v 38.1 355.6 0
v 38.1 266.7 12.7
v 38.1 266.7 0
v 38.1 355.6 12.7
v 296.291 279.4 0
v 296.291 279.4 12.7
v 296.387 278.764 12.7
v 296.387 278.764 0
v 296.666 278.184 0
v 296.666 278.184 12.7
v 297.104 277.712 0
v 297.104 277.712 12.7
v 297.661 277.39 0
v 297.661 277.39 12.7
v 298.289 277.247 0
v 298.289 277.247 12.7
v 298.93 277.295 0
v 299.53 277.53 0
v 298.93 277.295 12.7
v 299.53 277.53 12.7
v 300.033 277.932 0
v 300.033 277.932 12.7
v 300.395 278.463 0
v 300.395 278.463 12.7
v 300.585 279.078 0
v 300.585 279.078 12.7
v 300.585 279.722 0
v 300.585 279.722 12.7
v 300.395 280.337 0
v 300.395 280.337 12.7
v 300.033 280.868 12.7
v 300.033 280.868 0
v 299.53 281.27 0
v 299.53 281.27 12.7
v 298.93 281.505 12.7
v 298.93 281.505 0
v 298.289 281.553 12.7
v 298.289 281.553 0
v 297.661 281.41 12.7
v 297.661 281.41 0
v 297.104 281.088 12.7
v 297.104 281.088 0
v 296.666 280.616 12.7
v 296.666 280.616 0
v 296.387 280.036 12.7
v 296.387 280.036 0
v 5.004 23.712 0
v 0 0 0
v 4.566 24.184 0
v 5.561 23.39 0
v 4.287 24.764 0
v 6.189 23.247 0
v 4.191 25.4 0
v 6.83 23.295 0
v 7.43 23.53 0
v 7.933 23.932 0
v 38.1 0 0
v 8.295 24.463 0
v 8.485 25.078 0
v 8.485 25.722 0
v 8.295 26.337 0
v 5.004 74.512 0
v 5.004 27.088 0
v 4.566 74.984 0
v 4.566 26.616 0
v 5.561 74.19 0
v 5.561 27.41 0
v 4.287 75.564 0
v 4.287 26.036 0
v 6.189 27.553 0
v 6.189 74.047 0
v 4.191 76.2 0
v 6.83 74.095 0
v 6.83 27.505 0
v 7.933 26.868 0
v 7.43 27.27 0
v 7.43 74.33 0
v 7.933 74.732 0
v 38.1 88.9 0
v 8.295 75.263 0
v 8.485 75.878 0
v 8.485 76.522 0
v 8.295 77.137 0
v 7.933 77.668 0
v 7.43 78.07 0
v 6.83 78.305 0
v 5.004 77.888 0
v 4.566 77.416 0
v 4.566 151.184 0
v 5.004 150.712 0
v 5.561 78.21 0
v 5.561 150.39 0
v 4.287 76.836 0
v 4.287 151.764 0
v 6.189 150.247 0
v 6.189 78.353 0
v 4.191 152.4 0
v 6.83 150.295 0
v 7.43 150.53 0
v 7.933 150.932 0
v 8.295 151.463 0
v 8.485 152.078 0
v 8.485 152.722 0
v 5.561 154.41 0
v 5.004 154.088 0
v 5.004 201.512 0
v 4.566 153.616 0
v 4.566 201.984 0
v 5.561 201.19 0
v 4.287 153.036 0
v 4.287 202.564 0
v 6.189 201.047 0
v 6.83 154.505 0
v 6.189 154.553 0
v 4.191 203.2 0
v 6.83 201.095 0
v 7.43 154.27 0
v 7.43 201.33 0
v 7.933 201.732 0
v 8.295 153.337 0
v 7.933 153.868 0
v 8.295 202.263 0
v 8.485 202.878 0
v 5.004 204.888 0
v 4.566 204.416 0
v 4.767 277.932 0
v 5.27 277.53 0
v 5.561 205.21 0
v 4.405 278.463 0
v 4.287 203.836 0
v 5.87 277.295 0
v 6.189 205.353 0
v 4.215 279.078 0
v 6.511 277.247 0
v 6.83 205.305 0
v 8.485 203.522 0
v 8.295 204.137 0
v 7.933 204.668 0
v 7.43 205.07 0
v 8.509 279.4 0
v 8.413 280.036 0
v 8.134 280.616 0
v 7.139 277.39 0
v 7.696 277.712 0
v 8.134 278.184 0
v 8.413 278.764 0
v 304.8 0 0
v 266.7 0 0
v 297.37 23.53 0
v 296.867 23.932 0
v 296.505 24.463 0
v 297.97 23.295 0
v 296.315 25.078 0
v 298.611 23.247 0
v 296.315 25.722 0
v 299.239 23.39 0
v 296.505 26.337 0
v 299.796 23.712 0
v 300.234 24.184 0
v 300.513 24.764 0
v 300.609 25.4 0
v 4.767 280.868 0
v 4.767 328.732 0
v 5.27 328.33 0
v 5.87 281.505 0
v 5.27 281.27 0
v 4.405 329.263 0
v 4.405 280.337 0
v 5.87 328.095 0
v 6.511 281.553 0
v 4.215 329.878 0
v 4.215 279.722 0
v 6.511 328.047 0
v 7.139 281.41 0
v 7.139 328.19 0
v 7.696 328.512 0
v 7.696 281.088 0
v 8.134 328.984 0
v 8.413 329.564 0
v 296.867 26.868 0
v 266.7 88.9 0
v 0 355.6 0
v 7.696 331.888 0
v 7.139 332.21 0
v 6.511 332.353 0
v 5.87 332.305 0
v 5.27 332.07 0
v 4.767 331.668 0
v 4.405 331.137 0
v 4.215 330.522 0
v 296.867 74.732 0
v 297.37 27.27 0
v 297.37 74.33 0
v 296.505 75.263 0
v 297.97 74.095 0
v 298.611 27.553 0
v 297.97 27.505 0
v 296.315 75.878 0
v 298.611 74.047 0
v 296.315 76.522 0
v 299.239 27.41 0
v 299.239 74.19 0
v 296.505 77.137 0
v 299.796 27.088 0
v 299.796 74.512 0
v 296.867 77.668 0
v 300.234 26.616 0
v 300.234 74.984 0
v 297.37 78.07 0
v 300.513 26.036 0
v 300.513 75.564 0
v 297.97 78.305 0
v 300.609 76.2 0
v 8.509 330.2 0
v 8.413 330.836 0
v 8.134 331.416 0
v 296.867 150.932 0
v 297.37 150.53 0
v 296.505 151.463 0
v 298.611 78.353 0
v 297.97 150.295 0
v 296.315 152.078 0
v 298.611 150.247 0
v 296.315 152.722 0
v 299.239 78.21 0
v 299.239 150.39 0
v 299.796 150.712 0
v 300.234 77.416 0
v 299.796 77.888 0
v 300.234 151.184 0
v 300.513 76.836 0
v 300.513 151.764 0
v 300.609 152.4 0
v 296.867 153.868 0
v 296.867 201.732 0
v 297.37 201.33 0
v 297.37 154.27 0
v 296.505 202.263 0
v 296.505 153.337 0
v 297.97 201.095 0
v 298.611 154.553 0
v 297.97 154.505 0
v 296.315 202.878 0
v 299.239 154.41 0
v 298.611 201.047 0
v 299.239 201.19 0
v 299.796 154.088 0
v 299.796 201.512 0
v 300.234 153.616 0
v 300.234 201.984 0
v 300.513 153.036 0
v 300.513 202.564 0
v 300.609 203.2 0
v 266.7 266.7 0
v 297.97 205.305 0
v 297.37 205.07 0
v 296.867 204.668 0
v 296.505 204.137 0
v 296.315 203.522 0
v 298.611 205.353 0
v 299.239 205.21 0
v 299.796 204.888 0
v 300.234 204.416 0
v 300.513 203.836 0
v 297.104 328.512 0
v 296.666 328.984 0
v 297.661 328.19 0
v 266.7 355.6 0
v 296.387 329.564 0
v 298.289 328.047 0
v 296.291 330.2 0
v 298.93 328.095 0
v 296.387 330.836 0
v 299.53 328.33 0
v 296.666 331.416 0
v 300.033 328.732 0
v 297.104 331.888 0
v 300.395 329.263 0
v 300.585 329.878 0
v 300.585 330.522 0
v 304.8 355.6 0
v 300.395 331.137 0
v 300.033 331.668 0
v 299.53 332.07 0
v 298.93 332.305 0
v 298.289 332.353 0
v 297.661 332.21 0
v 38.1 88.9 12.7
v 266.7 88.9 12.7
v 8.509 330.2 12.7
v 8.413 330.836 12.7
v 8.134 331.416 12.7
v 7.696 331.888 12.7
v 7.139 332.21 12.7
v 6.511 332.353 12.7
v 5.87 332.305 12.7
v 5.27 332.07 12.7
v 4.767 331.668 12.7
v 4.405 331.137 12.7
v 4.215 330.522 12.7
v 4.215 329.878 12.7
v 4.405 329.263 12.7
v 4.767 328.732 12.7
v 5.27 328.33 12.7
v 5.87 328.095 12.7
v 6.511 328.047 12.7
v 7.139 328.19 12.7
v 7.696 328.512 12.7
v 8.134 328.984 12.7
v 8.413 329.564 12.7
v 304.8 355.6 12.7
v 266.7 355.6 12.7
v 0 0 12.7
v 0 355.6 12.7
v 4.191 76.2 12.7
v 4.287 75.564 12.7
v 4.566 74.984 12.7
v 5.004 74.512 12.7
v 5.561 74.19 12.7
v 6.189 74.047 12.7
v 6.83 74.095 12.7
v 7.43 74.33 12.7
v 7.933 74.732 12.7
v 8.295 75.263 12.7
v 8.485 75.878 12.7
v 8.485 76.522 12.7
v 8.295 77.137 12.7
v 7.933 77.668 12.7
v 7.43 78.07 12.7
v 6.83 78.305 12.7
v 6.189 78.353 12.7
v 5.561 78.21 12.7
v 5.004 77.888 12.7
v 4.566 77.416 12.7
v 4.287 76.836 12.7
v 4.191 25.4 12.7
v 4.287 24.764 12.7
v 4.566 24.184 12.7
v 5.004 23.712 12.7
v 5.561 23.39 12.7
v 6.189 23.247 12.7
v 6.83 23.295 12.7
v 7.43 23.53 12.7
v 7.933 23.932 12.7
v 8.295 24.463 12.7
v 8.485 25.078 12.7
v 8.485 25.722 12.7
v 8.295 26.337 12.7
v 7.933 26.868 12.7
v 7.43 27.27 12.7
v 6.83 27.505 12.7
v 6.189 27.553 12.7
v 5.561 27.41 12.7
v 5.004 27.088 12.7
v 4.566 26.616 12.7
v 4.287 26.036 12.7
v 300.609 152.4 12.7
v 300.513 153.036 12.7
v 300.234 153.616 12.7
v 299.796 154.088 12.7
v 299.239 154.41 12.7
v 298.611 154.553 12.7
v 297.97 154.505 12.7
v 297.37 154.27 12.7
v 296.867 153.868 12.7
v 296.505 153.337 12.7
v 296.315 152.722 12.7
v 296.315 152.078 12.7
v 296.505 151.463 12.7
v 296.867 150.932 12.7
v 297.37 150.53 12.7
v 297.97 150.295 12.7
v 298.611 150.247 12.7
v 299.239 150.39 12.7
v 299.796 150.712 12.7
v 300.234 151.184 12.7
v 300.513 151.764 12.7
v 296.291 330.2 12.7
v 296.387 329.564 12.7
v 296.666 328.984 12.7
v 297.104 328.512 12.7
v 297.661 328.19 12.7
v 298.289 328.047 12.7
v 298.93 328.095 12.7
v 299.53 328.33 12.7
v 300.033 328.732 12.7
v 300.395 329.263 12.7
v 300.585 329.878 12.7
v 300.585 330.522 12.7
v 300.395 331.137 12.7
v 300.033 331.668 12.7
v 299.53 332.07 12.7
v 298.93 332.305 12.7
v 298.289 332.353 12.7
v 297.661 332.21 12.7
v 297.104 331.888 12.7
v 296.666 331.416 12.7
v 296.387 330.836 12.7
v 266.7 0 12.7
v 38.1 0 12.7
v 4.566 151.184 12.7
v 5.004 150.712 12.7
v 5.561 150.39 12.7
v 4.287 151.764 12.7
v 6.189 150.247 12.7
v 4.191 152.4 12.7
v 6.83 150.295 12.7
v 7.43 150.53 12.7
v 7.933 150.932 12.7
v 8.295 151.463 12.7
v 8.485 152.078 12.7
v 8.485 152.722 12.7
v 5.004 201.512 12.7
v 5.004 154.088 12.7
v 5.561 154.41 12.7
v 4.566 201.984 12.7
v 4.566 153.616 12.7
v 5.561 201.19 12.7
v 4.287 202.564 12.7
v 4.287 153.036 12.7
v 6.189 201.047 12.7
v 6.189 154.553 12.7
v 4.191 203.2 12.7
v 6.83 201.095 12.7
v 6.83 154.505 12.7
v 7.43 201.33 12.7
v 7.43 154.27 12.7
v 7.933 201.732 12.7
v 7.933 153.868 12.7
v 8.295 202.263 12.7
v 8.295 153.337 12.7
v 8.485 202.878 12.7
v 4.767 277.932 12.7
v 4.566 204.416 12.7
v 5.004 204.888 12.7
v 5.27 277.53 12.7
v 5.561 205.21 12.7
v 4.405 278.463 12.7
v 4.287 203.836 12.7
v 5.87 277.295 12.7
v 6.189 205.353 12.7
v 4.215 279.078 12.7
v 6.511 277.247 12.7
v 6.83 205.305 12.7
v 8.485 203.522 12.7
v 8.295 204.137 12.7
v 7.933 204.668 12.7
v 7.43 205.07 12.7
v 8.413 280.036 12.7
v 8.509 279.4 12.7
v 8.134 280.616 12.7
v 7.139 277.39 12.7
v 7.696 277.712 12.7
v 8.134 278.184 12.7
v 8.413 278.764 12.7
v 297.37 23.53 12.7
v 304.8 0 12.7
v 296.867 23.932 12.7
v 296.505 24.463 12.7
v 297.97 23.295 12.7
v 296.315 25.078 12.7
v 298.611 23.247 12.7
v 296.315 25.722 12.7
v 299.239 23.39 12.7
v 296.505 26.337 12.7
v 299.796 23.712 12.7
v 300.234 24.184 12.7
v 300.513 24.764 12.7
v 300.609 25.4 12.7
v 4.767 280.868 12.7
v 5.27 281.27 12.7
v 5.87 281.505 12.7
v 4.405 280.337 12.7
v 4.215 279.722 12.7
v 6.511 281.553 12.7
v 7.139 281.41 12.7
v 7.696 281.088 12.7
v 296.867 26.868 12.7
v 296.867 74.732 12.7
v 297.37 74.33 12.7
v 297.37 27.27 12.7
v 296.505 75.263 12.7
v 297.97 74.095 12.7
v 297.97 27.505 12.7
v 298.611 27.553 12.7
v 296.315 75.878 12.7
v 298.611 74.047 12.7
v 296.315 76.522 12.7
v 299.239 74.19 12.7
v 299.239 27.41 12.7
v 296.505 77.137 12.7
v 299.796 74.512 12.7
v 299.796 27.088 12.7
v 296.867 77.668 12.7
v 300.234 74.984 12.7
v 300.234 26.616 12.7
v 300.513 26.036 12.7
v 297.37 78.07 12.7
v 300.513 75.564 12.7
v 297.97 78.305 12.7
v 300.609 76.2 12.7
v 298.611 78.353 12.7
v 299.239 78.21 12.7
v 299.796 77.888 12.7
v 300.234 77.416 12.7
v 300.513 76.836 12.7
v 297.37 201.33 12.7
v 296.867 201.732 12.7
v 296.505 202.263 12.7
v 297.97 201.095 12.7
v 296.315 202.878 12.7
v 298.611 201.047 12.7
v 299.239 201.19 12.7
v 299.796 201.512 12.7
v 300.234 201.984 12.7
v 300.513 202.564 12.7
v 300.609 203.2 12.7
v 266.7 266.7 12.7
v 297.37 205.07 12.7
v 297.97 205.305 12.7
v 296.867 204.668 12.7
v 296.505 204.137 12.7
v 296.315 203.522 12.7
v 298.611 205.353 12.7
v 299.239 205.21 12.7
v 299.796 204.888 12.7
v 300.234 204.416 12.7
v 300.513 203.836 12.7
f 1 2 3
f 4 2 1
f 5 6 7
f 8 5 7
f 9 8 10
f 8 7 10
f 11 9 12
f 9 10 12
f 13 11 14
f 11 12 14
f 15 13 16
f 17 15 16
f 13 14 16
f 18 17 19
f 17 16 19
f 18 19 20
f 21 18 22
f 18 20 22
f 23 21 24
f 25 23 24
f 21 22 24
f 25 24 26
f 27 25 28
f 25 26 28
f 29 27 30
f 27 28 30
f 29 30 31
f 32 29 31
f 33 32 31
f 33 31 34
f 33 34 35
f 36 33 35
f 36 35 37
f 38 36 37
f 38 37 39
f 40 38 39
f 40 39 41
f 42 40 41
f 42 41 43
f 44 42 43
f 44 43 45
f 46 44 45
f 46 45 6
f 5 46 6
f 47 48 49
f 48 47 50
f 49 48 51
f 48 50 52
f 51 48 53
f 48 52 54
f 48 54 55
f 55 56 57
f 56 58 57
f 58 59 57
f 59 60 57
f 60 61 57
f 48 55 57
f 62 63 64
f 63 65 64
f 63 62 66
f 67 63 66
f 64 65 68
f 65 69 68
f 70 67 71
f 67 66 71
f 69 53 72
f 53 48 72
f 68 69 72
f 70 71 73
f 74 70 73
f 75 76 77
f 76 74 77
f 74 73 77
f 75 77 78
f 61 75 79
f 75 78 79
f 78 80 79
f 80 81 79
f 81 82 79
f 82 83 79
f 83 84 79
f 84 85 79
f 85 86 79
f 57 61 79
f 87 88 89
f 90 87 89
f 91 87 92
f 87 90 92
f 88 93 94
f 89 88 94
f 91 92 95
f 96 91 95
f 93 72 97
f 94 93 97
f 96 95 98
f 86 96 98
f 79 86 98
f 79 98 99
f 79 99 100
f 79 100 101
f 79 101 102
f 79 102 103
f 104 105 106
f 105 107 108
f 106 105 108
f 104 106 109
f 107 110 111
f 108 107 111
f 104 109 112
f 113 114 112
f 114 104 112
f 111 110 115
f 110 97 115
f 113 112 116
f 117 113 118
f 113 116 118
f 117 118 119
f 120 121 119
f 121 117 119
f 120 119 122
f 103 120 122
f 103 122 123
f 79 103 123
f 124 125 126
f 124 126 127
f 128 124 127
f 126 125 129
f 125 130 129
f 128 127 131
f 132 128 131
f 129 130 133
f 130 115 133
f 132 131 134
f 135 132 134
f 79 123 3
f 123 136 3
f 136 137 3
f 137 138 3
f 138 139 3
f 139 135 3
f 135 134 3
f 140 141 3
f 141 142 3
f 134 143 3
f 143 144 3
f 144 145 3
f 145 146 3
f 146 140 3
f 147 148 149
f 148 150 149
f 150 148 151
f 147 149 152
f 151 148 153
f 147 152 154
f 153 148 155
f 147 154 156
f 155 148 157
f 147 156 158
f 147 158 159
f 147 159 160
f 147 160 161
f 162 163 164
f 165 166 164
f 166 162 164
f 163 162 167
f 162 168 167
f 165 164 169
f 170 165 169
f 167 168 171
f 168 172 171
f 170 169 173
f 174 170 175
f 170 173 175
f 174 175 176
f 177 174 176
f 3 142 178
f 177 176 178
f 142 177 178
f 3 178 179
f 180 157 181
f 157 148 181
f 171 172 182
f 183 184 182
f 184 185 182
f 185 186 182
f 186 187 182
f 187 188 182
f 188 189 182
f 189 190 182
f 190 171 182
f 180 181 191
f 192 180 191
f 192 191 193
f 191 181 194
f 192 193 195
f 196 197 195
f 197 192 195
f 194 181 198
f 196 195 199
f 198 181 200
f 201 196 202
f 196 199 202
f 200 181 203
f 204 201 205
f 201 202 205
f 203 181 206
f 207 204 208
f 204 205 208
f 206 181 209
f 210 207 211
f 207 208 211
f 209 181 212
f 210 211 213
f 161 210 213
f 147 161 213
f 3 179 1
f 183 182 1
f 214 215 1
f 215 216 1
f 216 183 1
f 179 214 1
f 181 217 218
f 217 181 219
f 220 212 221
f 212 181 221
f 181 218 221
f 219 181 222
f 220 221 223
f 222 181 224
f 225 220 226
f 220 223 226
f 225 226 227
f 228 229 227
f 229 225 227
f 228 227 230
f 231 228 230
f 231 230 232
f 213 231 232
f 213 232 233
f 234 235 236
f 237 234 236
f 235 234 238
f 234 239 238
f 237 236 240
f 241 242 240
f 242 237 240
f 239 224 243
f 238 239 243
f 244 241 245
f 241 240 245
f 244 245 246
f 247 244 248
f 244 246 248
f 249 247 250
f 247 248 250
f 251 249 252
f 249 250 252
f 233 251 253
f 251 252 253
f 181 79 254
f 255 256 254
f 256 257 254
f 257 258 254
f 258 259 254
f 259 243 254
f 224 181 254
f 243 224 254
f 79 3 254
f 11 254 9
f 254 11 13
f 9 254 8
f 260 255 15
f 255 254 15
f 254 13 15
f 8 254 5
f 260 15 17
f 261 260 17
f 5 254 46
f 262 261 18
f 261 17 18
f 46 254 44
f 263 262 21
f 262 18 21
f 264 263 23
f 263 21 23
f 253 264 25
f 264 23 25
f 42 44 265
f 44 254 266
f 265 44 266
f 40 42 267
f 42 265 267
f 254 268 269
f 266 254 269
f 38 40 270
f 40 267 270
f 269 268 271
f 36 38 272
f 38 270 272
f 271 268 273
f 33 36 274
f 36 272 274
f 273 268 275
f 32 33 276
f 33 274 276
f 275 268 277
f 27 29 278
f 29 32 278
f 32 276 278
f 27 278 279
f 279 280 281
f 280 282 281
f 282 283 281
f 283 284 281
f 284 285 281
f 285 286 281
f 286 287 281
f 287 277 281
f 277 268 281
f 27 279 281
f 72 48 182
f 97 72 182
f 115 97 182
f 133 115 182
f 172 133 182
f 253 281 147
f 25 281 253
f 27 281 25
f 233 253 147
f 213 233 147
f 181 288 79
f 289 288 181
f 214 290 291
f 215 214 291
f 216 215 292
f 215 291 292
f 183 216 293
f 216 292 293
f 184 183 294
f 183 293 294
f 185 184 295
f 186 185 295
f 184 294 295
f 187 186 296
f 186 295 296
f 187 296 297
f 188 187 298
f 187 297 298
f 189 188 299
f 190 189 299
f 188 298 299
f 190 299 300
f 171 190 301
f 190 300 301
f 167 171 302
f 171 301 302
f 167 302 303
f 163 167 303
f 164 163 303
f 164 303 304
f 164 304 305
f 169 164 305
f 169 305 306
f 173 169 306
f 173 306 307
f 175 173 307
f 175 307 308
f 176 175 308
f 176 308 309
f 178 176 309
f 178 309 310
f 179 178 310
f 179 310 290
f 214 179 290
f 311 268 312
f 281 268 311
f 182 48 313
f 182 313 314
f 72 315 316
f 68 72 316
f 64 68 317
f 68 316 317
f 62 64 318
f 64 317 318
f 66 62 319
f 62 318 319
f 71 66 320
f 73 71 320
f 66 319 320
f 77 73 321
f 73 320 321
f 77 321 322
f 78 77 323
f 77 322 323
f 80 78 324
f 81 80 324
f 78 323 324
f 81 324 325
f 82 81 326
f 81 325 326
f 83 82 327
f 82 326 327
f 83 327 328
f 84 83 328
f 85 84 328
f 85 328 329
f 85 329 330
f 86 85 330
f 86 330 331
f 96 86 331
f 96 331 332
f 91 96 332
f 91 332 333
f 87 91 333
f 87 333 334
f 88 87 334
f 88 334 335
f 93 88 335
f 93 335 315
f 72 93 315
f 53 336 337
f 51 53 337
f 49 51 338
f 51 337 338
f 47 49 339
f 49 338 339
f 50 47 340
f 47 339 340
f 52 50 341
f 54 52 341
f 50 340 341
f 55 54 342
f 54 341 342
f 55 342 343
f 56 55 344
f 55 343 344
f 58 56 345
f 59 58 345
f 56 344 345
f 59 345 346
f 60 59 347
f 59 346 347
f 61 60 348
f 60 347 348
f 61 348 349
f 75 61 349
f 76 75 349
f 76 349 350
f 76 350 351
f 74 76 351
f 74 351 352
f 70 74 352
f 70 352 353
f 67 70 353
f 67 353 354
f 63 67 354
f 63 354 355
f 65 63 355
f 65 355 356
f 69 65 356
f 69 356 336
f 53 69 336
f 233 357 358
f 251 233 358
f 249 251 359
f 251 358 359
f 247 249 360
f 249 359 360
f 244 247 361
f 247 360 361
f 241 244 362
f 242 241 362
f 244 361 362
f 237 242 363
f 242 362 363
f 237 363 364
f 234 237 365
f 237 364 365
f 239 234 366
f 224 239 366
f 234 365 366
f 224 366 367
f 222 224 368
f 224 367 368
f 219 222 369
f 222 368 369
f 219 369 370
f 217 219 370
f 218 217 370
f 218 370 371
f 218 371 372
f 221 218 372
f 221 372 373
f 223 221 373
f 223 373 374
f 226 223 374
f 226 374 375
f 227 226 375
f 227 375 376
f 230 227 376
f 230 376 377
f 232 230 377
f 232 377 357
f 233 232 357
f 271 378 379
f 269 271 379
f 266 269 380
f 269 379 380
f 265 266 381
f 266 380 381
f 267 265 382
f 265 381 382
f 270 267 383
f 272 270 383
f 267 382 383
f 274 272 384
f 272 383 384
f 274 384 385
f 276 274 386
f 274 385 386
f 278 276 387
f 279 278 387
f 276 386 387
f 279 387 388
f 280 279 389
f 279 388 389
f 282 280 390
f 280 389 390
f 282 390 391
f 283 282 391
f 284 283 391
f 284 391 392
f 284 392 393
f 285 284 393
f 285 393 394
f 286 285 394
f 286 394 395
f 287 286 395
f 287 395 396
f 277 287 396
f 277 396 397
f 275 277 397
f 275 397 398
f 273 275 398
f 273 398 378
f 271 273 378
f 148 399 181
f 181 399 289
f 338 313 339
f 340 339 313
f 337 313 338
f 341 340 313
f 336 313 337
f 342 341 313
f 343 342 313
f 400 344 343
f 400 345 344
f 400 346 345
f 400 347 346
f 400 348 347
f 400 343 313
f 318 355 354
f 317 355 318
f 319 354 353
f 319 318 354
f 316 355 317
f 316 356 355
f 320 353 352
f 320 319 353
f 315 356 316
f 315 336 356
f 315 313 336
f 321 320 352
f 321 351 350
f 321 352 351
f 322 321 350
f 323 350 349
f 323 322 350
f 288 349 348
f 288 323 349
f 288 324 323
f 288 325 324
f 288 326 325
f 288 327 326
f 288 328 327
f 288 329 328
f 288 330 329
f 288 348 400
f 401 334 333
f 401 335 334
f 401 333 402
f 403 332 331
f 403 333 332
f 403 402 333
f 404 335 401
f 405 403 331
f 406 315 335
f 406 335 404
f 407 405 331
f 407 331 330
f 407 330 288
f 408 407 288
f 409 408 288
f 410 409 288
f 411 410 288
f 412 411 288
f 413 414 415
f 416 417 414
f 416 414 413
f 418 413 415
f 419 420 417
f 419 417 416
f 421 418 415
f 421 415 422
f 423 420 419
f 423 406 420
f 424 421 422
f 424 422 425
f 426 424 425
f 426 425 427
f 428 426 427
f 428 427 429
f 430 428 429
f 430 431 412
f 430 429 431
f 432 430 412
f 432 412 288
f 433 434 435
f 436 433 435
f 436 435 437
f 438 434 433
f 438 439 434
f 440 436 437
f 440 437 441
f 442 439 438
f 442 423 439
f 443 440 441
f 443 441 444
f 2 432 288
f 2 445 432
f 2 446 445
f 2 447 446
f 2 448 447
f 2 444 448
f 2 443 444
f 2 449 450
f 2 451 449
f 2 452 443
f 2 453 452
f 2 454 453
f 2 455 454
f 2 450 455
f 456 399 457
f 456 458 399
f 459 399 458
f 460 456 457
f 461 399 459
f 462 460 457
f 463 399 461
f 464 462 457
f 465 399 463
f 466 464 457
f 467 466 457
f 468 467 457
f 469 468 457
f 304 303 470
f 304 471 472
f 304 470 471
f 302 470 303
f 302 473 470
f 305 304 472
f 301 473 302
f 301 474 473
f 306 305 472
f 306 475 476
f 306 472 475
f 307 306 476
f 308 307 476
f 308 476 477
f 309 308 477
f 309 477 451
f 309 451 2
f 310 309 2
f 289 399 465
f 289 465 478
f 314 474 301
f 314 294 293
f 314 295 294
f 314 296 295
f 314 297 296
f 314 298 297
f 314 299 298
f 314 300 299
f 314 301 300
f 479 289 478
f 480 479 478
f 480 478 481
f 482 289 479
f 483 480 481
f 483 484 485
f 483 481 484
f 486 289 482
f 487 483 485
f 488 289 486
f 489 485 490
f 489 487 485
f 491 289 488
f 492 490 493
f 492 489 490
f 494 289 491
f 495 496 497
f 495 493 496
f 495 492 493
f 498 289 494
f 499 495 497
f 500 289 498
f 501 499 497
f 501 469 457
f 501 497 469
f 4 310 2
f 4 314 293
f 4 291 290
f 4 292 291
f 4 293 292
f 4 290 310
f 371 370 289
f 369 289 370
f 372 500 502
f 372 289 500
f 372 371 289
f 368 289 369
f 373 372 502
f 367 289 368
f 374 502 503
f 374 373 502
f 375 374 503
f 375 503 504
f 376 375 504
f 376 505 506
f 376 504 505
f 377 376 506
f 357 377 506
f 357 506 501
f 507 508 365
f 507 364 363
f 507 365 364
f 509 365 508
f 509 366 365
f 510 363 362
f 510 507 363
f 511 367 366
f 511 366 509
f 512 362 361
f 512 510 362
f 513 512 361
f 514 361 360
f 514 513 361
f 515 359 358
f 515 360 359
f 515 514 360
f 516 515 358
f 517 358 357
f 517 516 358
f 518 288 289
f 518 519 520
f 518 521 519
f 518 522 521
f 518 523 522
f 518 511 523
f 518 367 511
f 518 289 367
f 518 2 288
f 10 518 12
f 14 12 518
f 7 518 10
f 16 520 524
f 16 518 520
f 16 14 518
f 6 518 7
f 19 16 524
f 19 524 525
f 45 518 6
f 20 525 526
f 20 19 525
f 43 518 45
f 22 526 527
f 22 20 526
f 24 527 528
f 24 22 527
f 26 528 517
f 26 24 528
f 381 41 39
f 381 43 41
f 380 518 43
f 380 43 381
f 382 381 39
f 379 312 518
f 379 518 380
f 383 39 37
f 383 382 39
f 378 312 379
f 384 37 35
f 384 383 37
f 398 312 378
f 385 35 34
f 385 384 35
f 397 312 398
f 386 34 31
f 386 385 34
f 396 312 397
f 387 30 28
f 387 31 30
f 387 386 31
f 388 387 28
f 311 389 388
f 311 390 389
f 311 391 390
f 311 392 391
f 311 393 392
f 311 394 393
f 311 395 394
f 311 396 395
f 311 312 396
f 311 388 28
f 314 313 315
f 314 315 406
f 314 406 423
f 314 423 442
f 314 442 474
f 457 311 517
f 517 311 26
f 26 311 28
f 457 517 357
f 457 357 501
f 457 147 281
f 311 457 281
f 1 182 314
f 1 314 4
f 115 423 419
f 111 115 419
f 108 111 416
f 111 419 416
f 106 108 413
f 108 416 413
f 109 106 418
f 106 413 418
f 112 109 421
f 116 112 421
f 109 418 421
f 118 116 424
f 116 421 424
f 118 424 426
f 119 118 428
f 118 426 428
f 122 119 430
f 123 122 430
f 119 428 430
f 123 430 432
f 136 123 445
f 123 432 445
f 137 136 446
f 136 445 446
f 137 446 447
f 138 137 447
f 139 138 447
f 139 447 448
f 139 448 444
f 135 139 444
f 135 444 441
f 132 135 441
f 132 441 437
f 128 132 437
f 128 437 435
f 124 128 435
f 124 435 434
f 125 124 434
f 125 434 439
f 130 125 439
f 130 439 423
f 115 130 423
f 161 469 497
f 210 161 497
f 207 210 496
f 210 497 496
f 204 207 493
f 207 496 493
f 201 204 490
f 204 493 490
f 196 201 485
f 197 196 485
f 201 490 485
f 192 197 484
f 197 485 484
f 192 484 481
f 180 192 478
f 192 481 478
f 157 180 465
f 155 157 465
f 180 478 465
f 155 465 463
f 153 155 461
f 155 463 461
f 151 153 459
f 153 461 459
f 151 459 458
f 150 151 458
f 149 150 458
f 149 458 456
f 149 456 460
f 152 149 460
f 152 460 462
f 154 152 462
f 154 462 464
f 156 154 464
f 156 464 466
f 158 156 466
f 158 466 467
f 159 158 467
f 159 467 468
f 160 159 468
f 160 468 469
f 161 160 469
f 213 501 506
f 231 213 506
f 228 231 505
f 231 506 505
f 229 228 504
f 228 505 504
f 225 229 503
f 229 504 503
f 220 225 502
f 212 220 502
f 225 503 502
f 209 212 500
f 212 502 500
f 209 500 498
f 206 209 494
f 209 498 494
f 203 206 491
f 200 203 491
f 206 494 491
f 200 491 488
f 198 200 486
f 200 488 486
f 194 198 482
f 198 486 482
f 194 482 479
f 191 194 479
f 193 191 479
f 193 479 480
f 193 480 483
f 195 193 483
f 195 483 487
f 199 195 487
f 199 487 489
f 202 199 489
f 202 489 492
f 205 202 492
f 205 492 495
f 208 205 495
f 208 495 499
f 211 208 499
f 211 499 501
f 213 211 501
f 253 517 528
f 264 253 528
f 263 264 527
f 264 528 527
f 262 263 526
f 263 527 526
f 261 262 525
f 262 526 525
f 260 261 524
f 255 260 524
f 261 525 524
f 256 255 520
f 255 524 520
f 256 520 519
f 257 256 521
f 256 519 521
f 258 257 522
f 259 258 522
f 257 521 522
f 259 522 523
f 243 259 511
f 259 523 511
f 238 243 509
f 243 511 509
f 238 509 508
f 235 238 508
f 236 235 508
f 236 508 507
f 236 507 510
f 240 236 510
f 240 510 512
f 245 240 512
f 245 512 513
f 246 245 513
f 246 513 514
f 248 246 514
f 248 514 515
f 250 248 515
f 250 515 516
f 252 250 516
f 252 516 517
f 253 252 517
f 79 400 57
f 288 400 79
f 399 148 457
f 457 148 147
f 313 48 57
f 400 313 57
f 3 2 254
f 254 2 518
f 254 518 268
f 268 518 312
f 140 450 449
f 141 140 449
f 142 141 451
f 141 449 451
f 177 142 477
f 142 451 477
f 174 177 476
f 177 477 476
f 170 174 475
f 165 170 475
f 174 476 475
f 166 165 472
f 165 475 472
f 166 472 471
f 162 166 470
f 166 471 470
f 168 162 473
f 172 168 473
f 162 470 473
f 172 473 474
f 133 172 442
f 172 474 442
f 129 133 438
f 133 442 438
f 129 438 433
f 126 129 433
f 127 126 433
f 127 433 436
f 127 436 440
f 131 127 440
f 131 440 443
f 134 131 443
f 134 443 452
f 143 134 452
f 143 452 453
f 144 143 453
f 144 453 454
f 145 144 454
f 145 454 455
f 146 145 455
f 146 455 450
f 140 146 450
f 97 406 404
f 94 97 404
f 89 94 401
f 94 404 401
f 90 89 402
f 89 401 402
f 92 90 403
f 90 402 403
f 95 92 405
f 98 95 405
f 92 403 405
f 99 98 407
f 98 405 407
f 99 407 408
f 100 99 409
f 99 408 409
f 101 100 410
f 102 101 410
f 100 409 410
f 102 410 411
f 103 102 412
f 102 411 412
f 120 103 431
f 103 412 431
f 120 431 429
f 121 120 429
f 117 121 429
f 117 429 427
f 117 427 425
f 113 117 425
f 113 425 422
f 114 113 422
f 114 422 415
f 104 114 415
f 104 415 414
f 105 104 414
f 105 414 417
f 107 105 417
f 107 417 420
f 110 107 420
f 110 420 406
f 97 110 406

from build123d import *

# Parameters (mm, degrees)
SKETCH1_W           = 304.8
SKETCH1_H           = 355.6
BOSS_EXTRUDE1_DEPTH = 12.7
SKETCH2_W           = 228.6
SKETCH2_H           = 88.9
CUT_EXTRUDE1_DEPTH  = 469.525015341
SKETCH3_R           = 2.159
CUT_EXTRUDE2_DEPTH  = 469.525015341


with BuildPart() as part:
    # Sketch1 → Boss-Extrude1 (new body)
    with BuildSketch(Plane.XY):
        with Locations((152.4, 177.8)):
            Rectangle(SKETCH1_W, SKETCH1_H)
    extrude(amount=BOSS_EXTRUDE1_DEPTH)

    # Sketch2 → Cut-Extrude1 (cut, through all)
    with BuildSketch(Plane.XY.offset(12.7)):
        with Locations((152.4, 44.45)):
            Rectangle(SKETCH2_W, SKETCH2_H)
        with Locations((152.4, 311.15)):
            Rectangle(SKETCH2_W, SKETCH2_H)
    extrude(amount=-CUT_EXTRUDE1_DEPTH, mode=Mode.SUBTRACT)

    # Sketch3 → Cut-Extrude2 (cut, through all)
    with BuildSketch(Plane.XY.offset(12.7)):
        with Locations((6.35, 330.2)):
            Circle(SKETCH3_R)
        with Locations((6.35, 279.4)):
            Circle(SKETCH3_R)
        with Locations(Location((6.35, 76.2, 0), (0, 0, 180))):
            Circle(SKETCH3_R)
        with Locations(Location((6.35, 25.4, 0), (0, 0, 180))):
            Circle(SKETCH3_R)
        with Locations((298.45, 25.4)):
            Circle(SKETCH3_R)
        with Locations((298.45, 76.2)):
            Circle(SKETCH3_R)
        with Locations(Location((298.45, 279.4, 0), (0, 0, 180))):
            Circle(SKETCH3_R)
        with Locations(Location((298.45, 330.2, 0), (0, 0, 180))):
            Circle(SKETCH3_R)
        with Locations(Location((6.35, 203.2, 0), (0, 0, 180))):
            Circle(SKETCH3_R)
        with Locations(Location((6.35, 152.4, 0), (0, 0, 180))):
            Circle(SKETCH3_R)
        with Locations((298.45, 152.4)):
            Circle(SKETCH3_R)
        with Locations((298.45, 203.2)):
            Circle(SKETCH3_R)
    extrude(amount=-CUT_EXTRUDE2_DEPTH, mode=Mode.SUBTRACT)


solid = part.part
